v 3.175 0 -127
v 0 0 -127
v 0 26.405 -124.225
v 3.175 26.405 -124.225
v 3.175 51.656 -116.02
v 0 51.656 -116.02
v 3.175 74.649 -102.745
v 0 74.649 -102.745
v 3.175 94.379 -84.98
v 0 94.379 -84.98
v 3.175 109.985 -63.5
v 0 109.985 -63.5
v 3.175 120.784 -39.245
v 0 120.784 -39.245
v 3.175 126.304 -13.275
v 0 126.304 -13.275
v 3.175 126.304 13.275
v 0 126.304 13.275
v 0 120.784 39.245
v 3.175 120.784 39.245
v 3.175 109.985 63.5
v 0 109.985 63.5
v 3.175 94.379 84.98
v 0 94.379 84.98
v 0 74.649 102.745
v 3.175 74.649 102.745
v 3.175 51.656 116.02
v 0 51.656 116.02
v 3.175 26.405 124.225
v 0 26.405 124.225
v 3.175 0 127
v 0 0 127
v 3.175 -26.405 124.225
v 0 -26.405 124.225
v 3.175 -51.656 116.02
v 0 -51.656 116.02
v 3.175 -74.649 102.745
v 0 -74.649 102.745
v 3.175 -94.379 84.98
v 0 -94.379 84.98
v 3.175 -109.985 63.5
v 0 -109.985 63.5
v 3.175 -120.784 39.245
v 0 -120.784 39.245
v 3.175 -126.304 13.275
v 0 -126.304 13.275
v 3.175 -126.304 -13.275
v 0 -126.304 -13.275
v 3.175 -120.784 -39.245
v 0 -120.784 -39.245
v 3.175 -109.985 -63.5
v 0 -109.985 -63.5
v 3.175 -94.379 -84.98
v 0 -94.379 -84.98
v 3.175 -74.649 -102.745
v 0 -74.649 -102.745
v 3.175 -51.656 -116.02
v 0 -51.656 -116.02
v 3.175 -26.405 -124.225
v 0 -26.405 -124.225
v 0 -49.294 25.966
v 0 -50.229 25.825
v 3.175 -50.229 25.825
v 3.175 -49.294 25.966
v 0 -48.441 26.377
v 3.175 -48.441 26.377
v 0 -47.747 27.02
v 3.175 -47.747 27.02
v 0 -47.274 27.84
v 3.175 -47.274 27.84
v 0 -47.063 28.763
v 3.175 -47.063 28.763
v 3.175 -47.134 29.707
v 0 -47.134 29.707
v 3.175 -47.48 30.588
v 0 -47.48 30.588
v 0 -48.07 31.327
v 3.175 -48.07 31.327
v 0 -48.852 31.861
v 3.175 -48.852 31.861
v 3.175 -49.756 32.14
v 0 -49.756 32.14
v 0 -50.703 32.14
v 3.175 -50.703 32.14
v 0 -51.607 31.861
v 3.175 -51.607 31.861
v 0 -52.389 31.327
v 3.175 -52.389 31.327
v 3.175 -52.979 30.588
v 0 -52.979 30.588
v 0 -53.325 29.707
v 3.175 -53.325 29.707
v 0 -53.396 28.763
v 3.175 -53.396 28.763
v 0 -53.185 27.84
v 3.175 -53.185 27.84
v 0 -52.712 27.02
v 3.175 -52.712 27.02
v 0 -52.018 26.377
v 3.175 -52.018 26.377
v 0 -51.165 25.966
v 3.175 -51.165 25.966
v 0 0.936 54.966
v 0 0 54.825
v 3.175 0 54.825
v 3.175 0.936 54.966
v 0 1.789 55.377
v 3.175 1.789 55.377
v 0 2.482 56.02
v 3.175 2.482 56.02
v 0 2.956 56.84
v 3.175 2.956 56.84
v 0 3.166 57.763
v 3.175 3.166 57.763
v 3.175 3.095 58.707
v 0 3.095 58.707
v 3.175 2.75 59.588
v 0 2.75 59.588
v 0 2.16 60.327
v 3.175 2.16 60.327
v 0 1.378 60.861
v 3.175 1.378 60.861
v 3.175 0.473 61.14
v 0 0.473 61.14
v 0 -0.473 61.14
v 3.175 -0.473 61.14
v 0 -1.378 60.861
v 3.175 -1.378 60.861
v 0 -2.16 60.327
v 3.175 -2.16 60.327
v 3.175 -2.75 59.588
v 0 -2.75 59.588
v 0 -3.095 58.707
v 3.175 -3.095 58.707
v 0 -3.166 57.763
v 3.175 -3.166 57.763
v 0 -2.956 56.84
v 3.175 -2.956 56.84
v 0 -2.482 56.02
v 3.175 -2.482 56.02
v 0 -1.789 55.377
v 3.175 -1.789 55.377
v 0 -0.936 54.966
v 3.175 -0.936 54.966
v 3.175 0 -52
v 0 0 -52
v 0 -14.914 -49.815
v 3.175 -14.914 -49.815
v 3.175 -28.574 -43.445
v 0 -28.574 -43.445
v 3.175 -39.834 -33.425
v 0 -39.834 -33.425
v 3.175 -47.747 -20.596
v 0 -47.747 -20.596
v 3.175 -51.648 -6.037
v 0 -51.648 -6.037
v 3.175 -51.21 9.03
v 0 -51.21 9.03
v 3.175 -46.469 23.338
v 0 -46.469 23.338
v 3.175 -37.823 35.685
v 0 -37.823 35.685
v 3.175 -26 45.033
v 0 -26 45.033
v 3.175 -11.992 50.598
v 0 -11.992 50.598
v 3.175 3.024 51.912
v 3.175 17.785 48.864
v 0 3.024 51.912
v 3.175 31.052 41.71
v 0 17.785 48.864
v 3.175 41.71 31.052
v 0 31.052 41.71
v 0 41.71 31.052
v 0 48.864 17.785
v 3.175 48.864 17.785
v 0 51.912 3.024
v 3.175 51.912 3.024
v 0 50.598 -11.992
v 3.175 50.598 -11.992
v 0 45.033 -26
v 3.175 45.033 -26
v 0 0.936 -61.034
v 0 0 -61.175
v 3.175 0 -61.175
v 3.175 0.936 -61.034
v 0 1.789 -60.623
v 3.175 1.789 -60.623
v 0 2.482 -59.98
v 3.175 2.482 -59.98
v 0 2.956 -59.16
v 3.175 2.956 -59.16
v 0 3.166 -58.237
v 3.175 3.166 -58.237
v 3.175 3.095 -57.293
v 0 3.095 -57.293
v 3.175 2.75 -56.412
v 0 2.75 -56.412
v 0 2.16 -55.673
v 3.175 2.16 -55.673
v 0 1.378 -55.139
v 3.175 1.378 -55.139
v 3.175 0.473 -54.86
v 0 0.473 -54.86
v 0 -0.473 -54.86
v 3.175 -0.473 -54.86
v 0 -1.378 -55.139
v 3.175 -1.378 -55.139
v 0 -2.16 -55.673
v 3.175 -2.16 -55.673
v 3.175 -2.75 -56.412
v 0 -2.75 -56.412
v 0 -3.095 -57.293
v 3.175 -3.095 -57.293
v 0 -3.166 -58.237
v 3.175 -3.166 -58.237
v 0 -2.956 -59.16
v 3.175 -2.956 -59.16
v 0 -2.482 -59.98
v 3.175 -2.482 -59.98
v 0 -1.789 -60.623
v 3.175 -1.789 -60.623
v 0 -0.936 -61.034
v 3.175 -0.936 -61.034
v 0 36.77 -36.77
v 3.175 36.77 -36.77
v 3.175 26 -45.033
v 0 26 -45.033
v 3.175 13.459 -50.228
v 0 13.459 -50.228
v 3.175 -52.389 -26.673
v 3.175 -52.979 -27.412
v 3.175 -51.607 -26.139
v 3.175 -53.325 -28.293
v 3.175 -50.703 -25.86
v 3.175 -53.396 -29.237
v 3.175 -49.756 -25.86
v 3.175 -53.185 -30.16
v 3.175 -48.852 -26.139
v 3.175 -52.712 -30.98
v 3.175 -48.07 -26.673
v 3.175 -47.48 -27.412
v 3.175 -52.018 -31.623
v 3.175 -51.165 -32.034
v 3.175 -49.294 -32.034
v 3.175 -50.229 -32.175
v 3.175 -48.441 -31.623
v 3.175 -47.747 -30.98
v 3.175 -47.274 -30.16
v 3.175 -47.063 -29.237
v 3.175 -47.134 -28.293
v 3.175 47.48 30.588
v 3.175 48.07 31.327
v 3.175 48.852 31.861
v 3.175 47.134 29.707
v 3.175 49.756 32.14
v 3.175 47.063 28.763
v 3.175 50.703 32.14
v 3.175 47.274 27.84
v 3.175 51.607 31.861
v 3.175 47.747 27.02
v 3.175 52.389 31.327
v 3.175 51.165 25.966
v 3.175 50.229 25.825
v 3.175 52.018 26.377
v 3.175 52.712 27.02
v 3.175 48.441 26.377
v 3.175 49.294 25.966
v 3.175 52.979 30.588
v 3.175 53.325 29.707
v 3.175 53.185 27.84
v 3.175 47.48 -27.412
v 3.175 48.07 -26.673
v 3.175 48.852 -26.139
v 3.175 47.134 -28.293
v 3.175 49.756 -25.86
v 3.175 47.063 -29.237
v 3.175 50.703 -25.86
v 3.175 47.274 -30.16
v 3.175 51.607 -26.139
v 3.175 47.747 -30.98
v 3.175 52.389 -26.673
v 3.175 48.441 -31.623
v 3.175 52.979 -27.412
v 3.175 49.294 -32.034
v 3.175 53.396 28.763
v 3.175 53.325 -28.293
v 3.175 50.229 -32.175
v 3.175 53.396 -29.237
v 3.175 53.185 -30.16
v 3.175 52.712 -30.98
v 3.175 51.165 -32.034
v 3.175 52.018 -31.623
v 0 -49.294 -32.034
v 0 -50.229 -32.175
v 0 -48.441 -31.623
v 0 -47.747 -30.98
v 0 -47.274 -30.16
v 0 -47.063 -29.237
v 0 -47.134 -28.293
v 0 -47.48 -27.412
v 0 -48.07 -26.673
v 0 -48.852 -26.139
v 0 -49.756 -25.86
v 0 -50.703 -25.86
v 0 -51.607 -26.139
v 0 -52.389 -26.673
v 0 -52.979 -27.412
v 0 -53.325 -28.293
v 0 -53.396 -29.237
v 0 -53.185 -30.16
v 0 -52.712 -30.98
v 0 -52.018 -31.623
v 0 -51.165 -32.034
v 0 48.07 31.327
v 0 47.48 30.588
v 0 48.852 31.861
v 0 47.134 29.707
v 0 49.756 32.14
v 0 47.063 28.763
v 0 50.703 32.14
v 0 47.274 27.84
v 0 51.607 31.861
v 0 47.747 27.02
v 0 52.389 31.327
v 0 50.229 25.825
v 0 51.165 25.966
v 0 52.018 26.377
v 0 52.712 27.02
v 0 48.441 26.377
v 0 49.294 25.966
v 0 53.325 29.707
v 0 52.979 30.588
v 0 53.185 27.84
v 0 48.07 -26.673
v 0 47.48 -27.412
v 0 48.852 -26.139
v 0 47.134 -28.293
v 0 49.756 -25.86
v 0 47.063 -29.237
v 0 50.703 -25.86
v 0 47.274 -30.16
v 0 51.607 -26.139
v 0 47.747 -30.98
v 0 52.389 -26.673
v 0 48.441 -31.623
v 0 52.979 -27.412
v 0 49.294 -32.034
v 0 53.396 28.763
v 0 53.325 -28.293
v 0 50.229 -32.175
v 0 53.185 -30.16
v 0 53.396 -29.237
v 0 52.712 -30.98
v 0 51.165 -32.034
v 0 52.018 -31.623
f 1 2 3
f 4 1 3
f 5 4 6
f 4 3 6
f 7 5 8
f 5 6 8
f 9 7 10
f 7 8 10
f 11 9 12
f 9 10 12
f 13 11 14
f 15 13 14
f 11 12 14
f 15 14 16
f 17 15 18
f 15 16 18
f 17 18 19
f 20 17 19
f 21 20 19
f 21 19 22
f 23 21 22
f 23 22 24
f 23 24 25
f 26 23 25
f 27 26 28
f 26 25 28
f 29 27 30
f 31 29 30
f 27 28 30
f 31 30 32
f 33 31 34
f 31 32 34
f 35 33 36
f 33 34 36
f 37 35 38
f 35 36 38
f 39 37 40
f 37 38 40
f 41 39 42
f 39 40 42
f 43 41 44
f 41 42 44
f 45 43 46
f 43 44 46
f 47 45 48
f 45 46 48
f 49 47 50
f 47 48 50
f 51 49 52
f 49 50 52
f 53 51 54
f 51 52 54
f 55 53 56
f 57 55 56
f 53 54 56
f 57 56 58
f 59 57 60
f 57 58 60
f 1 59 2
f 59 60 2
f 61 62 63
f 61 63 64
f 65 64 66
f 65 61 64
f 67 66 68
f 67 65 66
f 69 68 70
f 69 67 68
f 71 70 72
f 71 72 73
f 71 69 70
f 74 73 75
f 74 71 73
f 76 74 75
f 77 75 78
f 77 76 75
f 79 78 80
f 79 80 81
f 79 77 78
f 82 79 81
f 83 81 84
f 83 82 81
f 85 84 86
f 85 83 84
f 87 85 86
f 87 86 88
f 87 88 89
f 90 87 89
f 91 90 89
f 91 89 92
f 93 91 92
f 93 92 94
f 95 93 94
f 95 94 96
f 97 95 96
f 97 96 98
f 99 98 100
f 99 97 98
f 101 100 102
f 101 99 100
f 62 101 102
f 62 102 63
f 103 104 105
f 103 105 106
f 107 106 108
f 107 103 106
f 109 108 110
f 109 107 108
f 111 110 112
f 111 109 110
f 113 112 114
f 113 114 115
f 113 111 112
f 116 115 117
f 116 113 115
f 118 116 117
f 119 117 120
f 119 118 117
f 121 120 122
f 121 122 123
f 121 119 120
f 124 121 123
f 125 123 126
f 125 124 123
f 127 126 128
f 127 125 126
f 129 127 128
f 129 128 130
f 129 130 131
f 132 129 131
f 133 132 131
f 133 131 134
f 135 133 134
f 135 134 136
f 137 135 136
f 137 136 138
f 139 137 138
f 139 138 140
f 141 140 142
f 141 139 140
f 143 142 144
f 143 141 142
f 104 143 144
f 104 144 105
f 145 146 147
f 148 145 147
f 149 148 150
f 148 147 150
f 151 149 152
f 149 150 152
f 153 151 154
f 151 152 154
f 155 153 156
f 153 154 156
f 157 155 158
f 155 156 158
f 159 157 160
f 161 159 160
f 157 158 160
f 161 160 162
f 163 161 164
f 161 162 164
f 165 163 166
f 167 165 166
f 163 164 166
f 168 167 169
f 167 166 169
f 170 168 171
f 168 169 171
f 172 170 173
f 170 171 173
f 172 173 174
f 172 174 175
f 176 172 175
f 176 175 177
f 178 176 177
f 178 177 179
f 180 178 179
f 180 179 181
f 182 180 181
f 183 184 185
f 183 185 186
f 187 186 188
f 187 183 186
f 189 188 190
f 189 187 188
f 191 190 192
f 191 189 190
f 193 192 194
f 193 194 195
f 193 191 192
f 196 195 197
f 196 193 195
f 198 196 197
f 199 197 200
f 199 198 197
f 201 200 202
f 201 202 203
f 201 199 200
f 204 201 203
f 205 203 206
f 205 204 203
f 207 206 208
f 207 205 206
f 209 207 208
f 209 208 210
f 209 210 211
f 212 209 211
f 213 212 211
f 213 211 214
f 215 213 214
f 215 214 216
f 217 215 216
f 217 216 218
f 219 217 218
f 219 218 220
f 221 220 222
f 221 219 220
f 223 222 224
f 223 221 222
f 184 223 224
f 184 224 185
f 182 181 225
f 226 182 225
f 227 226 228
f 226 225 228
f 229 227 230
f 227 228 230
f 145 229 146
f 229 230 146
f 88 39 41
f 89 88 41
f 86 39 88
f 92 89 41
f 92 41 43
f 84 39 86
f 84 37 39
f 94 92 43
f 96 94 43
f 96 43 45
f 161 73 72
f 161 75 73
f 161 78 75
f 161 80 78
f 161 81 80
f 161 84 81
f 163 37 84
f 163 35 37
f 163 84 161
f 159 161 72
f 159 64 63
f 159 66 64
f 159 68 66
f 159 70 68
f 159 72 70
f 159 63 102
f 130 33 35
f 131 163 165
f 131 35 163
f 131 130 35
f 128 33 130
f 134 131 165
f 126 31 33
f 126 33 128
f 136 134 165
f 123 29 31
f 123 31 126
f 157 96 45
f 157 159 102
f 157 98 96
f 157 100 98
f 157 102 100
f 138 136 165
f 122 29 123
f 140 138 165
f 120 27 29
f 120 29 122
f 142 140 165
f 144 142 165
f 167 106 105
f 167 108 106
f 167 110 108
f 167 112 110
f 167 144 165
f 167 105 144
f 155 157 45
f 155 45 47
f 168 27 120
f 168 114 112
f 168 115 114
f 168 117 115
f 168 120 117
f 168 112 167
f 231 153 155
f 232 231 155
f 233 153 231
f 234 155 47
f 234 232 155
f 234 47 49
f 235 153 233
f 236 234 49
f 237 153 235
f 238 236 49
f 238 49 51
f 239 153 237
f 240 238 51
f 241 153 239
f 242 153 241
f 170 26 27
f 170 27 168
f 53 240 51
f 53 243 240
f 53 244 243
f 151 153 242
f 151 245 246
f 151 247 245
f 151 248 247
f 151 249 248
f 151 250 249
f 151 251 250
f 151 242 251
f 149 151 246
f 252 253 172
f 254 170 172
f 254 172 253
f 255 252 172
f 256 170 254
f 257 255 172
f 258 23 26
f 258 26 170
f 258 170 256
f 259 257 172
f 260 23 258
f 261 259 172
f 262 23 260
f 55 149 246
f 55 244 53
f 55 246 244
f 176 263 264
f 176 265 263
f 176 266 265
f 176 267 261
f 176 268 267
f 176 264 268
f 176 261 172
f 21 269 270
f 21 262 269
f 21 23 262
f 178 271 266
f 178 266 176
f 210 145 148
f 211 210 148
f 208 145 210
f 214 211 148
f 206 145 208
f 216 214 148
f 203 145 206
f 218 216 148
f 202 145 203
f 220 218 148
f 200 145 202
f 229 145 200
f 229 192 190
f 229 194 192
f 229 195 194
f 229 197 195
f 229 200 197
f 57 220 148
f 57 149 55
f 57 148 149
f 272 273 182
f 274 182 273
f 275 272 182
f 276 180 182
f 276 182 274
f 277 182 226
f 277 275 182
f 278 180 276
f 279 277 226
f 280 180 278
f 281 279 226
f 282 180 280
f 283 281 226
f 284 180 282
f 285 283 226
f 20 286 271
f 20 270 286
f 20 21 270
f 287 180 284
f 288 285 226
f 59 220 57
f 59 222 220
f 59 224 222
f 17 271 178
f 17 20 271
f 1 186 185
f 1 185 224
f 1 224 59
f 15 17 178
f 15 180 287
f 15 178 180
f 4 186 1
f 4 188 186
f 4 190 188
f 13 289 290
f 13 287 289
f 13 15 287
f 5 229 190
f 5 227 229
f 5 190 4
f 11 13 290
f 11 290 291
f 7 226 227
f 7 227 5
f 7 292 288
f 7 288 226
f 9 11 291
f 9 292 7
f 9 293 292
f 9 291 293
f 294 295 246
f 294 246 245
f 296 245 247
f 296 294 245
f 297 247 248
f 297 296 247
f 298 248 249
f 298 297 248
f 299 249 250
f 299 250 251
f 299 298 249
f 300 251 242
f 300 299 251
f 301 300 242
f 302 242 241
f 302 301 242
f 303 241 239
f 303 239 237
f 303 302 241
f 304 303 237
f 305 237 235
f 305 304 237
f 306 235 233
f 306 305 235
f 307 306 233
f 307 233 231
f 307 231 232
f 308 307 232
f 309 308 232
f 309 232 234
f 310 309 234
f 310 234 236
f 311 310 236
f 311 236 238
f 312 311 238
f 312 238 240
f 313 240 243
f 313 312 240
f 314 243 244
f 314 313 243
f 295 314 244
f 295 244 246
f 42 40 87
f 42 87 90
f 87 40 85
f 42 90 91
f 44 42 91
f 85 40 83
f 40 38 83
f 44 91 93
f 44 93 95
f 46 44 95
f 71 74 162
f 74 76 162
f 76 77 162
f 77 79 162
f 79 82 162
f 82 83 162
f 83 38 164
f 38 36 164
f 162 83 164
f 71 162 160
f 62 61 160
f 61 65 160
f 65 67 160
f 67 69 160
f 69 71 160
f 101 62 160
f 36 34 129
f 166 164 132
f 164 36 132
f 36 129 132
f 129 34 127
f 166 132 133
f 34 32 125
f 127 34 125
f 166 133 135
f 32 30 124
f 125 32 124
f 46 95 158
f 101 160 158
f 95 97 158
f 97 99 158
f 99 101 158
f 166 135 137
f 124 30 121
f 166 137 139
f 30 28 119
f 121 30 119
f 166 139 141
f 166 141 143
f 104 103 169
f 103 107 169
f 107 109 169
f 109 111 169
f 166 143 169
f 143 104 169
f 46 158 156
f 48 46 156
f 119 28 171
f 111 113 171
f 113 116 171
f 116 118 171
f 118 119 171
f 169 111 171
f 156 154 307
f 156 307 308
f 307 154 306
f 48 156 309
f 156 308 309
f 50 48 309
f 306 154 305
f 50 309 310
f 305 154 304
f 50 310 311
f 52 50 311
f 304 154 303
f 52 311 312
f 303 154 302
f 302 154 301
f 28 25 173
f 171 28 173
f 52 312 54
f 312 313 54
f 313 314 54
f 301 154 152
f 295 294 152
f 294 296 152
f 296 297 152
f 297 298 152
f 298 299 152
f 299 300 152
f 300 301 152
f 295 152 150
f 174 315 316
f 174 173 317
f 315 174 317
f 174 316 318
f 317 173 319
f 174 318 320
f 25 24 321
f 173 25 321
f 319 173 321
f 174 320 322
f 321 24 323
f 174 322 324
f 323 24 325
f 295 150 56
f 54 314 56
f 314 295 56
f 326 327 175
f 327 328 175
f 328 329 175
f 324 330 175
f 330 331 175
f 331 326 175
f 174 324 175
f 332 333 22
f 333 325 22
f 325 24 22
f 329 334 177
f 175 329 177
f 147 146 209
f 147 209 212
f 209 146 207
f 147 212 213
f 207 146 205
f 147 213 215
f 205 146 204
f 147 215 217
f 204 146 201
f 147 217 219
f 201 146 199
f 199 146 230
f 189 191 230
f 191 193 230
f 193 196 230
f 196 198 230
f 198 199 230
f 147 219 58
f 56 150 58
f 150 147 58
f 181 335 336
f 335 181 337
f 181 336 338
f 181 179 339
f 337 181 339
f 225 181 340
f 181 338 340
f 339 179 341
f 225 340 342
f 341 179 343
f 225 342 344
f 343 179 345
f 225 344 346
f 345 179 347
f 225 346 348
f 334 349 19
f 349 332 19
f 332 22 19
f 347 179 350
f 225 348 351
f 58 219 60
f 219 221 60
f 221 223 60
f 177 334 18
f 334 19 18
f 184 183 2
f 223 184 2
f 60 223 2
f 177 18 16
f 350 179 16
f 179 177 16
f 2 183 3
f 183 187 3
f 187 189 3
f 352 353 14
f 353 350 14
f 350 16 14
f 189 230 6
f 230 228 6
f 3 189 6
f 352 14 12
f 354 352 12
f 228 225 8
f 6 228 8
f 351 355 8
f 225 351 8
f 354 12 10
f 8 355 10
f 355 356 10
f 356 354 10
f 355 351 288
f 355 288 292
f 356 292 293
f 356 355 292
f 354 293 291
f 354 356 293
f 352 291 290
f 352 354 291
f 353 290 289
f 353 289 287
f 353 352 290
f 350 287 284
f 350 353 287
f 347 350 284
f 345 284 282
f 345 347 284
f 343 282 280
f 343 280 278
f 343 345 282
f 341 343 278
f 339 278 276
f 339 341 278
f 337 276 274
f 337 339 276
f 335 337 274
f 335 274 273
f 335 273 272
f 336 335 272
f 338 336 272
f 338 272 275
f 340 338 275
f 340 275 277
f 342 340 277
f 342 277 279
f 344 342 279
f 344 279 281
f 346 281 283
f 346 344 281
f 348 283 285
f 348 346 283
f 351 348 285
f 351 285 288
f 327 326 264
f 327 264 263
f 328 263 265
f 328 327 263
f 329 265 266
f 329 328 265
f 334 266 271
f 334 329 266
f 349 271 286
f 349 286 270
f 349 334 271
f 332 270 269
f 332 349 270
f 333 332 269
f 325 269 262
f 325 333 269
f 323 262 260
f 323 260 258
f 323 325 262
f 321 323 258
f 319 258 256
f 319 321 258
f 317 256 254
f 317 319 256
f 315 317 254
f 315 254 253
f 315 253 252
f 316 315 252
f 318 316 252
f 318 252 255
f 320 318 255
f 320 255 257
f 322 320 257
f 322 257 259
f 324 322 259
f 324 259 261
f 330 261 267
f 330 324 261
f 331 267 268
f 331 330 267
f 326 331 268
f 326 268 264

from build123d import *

# Parameters (mm, degrees)
SKETCH1_R           = 127
SKETCH1_R_2         = 3.175
BOSS_EXTRUDE1_DEPTH = 3.175


with BuildPart() as part:
    # Sketch1 → Boss-Extrude1 (new body)
    with BuildSketch(Plane(origin=(0, 0, 0), x_dir=(0, 0, -1), z_dir=(1, 0, 0))):
        Circle(SKETCH1_R)
        with Locations((-29, -50.229473419)):
            Circle(SKETCH1_R_2, mode=Mode.SUBTRACT)
        with Locations((29, -50.229473419)):
            Circle(SKETCH1_R_2, mode=Mode.SUBTRACT)
        with Locations((-58, 0)):
            Circle(SKETCH1_R_2, mode=Mode.SUBTRACT)
        with Locations((-29, 50.229473419)):
            Circle(SKETCH1_R_2, mode=Mode.SUBTRACT)
        with BuildLine():
            ThreePointArc((26, 45.033320997), (45.033320997, 26), (52, 0))
            ThreePointArc((52, 0), (-45.033320997, -26), (26, 45.033320997))
        make_face(mode=Mode.SUBTRACT)
        with Locations((58, 0)):
            Circle(SKETCH1_R_2, mode=Mode.SUBTRACT)
        with Locations((29, 50.229473419)):
            Circle(SKETCH1_R_2, mode=Mode.SUBTRACT)
    extrude(amount=BOSS_EXTRUDE1_DEPTH)


solid = part.part
